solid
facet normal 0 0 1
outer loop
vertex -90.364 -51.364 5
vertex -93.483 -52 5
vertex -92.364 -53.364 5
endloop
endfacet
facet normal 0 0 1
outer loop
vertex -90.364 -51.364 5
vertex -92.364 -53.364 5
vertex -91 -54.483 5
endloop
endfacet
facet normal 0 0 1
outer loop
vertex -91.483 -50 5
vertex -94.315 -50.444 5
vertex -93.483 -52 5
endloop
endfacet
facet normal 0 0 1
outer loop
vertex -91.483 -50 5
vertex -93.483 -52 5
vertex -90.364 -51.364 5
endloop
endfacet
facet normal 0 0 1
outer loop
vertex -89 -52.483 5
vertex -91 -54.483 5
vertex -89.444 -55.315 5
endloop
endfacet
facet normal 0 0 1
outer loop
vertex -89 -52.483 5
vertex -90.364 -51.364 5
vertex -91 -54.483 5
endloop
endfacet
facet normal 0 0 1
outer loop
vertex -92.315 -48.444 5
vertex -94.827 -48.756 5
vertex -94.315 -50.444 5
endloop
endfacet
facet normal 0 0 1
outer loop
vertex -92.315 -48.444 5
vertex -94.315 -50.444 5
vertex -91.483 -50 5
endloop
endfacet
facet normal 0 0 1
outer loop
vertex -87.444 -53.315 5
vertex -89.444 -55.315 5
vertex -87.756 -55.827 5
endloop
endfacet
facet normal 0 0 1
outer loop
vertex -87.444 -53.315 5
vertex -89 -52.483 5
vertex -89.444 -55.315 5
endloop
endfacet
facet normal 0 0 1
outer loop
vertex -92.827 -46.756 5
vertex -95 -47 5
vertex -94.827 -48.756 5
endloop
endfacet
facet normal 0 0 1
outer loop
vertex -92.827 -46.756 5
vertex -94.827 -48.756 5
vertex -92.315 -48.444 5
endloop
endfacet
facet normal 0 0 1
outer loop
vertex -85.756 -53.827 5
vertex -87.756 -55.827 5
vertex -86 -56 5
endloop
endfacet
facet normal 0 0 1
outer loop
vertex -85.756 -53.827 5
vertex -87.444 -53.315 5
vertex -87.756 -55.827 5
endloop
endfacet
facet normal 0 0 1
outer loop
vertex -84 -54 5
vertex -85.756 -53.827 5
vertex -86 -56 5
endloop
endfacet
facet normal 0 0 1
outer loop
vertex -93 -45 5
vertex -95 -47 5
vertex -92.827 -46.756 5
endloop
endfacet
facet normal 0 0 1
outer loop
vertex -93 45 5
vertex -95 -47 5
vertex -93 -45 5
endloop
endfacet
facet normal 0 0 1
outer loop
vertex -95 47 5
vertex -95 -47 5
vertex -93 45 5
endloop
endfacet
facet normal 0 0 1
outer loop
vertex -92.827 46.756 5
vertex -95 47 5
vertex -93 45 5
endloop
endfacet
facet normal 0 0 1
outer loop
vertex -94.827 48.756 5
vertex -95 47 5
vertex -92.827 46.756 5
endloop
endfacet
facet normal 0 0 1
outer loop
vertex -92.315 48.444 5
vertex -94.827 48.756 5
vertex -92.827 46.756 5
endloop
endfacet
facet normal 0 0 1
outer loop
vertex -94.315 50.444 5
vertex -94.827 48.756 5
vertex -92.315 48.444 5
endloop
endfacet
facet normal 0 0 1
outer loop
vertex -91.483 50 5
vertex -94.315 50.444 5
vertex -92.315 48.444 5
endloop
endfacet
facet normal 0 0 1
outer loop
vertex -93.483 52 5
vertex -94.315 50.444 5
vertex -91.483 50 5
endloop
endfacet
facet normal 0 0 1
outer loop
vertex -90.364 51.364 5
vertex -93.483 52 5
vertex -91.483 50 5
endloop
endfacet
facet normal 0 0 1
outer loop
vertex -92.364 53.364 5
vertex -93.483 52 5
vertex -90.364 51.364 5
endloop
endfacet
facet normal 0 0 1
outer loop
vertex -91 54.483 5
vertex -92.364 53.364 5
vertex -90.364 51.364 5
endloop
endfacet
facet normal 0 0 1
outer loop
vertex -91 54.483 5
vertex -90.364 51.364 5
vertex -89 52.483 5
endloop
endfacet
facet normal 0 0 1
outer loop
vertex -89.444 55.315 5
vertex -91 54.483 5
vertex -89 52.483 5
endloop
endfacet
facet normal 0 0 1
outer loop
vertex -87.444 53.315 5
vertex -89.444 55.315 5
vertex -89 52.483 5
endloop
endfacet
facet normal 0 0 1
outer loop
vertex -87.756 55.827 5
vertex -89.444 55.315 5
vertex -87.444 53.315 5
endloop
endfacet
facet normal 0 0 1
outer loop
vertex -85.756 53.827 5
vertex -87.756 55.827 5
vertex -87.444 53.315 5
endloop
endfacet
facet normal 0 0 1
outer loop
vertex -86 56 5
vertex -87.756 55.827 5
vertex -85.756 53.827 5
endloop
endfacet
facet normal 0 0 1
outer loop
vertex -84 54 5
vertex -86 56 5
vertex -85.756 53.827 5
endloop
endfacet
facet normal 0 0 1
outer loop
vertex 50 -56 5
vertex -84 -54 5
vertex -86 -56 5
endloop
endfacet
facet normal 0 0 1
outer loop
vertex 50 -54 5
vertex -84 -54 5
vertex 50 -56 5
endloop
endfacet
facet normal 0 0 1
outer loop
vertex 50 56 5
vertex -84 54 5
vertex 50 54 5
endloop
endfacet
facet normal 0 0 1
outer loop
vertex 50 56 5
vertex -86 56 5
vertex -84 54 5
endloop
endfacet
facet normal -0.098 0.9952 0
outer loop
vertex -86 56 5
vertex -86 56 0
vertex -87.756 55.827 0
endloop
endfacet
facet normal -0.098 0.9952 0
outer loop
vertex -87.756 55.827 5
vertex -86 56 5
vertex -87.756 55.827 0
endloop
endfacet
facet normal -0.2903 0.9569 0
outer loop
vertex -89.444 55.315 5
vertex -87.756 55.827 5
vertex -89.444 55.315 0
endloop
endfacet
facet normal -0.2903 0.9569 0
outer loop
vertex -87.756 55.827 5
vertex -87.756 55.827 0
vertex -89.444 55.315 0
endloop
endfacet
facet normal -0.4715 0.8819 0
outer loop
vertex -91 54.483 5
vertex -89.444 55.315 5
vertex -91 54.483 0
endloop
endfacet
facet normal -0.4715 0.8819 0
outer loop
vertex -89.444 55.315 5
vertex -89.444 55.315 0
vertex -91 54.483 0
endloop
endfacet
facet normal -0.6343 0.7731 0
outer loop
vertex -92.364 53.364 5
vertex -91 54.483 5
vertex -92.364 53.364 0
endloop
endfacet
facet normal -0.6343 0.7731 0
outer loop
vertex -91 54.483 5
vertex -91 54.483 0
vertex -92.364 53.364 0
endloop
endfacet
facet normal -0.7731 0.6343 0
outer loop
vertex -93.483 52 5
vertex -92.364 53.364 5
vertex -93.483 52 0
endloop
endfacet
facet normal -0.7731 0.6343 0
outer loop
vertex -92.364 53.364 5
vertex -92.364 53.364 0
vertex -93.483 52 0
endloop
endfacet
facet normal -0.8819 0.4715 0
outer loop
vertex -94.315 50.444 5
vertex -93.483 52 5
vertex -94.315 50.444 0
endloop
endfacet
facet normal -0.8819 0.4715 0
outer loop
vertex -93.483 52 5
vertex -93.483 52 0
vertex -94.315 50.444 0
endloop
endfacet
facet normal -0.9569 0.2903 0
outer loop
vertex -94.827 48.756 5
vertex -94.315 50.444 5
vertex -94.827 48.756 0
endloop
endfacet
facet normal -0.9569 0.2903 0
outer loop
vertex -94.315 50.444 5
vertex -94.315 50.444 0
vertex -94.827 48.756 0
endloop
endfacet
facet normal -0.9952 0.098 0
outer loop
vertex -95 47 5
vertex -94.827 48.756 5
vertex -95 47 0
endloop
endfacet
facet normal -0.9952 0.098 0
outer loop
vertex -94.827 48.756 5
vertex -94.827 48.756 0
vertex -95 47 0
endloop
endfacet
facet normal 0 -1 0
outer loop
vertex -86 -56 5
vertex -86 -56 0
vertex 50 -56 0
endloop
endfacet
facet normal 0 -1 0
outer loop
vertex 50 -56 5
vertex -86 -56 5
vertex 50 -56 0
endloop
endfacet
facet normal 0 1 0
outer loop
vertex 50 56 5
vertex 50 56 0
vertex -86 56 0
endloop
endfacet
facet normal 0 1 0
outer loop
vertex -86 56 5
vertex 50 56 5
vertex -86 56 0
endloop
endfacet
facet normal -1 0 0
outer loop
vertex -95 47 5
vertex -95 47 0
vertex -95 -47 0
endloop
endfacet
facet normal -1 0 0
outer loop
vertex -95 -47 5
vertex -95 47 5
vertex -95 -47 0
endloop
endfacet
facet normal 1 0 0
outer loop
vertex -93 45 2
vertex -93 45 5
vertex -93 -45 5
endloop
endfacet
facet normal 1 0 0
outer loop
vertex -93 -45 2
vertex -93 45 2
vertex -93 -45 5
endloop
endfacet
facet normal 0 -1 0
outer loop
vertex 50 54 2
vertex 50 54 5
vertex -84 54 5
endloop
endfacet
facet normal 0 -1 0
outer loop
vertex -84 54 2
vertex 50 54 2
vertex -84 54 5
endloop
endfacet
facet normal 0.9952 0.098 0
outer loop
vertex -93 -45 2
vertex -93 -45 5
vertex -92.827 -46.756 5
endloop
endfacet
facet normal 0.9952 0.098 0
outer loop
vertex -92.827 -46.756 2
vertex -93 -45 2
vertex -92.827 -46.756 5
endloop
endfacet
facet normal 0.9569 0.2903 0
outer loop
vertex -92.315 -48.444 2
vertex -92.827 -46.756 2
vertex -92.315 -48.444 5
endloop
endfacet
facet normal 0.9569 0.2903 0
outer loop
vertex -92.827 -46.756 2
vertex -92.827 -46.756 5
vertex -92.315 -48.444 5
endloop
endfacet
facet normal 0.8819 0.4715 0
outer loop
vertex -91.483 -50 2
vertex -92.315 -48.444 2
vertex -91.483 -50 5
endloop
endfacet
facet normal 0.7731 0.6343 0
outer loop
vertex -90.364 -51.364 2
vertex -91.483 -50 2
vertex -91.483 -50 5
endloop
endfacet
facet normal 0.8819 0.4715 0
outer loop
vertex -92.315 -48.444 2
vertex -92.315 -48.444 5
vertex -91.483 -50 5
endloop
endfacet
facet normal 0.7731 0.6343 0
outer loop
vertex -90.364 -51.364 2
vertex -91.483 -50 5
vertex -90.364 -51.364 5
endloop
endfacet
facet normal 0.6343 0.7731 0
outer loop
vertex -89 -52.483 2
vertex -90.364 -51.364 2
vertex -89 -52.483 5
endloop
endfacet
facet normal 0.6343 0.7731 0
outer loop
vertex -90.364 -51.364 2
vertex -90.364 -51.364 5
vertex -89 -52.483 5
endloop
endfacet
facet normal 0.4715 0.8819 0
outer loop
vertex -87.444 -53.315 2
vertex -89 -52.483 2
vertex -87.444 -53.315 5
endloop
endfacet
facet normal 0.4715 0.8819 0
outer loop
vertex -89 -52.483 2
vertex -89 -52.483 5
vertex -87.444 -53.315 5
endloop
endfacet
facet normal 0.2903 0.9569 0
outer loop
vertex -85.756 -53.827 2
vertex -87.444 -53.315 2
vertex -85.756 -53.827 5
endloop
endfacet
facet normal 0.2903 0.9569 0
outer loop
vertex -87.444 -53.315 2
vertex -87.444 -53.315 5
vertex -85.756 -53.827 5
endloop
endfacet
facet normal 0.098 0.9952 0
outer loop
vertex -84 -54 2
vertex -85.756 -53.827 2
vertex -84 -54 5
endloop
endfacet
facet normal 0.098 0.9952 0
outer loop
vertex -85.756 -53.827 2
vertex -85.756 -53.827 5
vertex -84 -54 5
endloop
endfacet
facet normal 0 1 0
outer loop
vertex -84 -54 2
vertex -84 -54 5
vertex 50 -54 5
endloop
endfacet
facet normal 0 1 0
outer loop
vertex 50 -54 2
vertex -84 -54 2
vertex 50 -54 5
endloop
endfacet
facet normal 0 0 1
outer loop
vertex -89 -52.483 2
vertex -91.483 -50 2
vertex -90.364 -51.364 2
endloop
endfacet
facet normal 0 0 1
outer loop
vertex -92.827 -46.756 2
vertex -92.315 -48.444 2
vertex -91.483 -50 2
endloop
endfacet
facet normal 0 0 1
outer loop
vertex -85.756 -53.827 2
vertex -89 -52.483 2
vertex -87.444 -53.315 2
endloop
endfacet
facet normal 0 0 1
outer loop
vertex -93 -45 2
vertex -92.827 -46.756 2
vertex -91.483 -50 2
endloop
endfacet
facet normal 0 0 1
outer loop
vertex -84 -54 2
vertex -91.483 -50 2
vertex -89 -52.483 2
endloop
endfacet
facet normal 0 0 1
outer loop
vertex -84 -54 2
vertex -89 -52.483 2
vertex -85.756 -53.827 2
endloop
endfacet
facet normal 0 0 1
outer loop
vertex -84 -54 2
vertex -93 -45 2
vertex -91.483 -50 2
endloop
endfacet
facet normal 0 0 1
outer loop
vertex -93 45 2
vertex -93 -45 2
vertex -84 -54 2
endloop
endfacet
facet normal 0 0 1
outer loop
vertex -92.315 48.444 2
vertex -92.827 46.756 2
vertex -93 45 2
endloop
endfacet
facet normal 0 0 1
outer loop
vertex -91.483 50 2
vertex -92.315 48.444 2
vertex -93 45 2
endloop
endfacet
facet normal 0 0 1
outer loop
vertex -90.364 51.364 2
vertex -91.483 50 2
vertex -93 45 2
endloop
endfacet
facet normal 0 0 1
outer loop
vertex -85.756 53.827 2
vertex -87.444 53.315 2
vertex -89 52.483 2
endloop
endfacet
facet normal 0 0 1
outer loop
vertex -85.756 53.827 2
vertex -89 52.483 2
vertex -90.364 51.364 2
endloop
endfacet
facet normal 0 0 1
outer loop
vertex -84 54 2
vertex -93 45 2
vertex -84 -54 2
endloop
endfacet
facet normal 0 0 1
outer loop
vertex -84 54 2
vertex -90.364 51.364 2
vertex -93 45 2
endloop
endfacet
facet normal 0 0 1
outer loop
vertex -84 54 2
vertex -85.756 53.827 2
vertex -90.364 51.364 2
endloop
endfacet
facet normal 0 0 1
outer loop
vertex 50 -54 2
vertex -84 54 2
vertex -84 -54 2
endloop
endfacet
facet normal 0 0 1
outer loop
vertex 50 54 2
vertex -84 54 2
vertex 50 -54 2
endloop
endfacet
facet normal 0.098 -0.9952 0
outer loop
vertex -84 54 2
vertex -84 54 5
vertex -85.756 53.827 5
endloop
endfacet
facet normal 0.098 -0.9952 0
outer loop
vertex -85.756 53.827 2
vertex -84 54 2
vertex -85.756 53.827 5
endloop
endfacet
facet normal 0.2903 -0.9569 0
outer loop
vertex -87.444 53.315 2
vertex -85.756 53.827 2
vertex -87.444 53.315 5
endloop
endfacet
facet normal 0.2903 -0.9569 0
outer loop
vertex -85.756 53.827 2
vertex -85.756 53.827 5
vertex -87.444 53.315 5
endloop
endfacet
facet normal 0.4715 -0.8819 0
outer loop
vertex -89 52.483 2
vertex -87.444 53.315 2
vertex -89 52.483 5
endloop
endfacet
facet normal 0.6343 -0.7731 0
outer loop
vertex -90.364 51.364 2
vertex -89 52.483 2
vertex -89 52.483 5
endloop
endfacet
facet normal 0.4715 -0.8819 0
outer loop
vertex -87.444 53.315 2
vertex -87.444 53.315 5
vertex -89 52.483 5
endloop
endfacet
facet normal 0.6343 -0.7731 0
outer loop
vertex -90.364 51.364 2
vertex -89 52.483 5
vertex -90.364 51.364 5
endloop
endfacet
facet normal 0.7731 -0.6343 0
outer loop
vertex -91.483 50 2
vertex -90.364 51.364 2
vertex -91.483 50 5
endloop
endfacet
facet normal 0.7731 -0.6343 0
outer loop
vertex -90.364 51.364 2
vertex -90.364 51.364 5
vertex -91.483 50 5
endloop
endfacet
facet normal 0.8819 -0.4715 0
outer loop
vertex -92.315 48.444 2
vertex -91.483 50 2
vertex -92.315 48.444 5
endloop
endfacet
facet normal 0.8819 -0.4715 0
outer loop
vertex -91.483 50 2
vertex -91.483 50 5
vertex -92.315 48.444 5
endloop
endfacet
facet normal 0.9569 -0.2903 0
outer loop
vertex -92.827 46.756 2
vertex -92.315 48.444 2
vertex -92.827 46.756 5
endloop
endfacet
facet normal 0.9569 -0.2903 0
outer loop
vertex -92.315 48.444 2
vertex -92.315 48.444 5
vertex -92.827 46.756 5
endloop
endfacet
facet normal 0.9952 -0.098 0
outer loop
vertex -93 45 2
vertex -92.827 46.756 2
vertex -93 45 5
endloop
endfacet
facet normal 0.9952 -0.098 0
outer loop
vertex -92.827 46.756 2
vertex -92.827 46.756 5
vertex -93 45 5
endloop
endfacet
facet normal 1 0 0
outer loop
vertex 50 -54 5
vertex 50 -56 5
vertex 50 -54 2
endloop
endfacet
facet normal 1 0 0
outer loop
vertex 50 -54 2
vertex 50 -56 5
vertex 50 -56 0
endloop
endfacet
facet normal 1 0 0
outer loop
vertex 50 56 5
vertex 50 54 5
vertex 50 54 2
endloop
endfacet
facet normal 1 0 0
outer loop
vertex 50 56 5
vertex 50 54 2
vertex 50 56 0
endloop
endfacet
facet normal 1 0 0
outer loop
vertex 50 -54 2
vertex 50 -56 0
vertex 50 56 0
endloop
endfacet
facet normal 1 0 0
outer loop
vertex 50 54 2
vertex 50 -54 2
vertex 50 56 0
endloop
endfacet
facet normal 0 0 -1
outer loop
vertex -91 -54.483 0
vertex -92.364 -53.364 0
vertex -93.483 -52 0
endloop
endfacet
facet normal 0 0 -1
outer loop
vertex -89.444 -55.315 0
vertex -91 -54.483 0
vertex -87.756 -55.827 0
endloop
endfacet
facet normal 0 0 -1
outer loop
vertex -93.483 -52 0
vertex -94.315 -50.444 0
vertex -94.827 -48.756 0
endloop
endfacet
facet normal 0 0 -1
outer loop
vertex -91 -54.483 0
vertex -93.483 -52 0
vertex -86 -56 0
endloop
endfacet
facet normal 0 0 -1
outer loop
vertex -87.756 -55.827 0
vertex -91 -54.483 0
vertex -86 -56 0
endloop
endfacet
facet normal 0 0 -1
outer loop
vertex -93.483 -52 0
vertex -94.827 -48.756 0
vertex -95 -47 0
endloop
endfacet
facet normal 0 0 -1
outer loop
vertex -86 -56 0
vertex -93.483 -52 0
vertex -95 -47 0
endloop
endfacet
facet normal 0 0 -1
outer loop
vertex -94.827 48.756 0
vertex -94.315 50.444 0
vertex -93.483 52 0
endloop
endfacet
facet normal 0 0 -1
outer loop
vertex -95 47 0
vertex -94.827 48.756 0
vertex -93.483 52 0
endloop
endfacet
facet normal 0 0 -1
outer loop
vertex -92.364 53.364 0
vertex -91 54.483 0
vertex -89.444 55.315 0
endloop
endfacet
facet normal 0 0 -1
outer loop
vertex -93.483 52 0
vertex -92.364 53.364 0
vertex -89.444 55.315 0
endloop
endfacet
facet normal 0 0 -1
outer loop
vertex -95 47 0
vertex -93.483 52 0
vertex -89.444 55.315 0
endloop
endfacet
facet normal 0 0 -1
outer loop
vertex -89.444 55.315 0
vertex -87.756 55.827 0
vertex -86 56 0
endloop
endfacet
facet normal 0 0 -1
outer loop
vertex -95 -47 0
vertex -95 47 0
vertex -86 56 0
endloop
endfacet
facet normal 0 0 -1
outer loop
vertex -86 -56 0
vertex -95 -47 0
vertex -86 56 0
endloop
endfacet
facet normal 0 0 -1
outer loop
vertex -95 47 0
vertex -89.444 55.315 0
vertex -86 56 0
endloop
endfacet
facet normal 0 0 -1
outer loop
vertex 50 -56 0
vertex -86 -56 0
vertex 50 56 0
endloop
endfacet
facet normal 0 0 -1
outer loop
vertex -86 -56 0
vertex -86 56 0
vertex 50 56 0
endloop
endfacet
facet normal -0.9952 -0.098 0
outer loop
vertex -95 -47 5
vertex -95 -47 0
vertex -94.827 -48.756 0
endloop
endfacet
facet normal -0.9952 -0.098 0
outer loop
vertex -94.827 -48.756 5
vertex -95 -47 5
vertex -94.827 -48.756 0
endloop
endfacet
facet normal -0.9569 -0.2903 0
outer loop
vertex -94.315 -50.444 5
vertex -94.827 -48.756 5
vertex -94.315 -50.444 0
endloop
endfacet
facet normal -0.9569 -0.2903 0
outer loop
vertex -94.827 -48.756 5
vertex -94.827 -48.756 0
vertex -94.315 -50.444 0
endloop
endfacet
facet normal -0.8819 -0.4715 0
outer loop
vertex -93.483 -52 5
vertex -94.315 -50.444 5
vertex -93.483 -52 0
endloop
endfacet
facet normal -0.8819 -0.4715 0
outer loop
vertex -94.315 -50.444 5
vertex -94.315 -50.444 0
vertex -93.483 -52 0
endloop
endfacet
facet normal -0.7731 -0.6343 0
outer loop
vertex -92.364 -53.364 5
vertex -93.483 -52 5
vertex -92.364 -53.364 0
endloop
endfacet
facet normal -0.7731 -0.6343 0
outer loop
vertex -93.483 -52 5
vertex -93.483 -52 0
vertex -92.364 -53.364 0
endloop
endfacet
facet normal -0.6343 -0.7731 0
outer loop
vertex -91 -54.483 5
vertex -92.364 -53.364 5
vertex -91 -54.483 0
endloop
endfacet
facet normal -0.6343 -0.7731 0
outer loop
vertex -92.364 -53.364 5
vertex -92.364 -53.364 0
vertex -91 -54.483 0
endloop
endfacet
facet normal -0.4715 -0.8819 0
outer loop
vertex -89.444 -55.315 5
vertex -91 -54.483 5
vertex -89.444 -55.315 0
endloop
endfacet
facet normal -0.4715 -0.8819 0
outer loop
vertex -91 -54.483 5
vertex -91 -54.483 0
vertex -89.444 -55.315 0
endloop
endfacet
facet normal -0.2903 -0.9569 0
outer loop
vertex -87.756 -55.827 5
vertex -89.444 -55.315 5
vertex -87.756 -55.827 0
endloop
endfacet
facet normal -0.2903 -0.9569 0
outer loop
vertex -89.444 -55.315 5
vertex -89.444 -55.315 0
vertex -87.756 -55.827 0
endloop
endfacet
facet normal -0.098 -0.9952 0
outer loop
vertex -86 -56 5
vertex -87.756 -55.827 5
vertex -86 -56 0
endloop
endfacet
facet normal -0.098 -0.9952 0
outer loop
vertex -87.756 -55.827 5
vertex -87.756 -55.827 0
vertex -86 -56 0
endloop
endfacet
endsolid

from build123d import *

# Parameters (mm, degrees)
F1_DEPTH = 5
F3_DEPTH = 3


with BuildPart() as f1:
    # F0 (on Top) → F1 (new body)
    with BuildSketch(Plane.XY):
        with BuildLine():
            ThreePointArc((-95, -47), (-92.363961, -53.363961), (-86, -56))
            Line((-86, -56), (50, -56))
            Line((50, -56), (50, 56))
            Line((50, 56), (-86, 56))
            ThreePointArc((-86, 56), (-92.363961, 53.363961), (-95, 47))
            Line((-95, 47), (-95, -47))
        make_face()
    extrude(amount=F1_DEPTH)

    # F2 (on face) → F3 (cut)
    with BuildSketch(Plane.XY.offset(5)):
        with BuildLine():
            Line((50, -54), (50, 54))
            Line((50, 54), (-84, 54))
            ThreePointArc((-84, 54), (-90.363961, 51.363961), (-93, 45))
            Line((-93, 45), (-93, -45))
            ThreePointArc((-93, -45), (-90.363961, -51.363961), (-84, -54))
            Line((-84, -54), (50, -54))
        make_face()
    extrude(amount=-F3_DEPTH, mode=Mode.SUBTRACT)


solid = f1.part
